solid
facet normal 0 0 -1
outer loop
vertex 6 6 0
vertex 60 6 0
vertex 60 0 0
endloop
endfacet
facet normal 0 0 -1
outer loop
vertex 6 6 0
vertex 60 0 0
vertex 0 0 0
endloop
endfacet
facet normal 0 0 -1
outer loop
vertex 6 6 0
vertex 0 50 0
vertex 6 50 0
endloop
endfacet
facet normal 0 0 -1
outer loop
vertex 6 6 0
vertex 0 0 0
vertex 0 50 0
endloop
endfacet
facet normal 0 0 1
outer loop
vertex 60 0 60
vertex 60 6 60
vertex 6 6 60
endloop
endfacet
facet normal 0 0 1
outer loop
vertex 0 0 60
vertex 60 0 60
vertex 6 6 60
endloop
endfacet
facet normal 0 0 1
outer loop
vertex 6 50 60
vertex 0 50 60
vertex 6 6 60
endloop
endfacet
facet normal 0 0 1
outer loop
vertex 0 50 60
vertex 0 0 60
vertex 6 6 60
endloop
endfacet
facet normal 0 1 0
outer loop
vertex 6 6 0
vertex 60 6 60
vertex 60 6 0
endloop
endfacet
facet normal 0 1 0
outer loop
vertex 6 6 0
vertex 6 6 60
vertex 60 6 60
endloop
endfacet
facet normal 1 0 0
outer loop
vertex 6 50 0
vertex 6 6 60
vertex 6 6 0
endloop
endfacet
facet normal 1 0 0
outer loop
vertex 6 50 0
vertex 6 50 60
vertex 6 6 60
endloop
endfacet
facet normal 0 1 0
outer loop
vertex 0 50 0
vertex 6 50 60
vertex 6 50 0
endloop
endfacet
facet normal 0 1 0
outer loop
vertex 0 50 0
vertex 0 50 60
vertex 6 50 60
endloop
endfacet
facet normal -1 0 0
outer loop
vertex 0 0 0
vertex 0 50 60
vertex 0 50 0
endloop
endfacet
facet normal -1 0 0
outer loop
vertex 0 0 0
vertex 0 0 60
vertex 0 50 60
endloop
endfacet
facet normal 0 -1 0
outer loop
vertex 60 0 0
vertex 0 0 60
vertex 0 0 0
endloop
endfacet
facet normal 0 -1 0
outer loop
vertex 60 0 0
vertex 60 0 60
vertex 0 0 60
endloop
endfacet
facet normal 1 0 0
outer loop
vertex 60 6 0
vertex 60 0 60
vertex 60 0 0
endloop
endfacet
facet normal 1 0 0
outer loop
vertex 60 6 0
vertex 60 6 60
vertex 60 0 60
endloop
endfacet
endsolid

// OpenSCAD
$fn = 32;

// ----------------------------------------------------------------------
// Structural section: angle 60 x 50 mm
// ----------------------------------------------------------------------

// --- parameters (mm) ---
sec_w = 60;               // leg width, X
sec_h = 50;               // leg height, Y
flange_t = 6;             // leg thickness
plate_t = 60;             // cut length, Z (extrusion height)

profile = [[0, 0], [60, 0], [60, 6], [6, 6], [6, 50], [0, 50]];  // primary outline, 6 points, counter clockwise

// --- the one profile operation ---
linear_extrude(height = plate_t) polygon(points = profile);
